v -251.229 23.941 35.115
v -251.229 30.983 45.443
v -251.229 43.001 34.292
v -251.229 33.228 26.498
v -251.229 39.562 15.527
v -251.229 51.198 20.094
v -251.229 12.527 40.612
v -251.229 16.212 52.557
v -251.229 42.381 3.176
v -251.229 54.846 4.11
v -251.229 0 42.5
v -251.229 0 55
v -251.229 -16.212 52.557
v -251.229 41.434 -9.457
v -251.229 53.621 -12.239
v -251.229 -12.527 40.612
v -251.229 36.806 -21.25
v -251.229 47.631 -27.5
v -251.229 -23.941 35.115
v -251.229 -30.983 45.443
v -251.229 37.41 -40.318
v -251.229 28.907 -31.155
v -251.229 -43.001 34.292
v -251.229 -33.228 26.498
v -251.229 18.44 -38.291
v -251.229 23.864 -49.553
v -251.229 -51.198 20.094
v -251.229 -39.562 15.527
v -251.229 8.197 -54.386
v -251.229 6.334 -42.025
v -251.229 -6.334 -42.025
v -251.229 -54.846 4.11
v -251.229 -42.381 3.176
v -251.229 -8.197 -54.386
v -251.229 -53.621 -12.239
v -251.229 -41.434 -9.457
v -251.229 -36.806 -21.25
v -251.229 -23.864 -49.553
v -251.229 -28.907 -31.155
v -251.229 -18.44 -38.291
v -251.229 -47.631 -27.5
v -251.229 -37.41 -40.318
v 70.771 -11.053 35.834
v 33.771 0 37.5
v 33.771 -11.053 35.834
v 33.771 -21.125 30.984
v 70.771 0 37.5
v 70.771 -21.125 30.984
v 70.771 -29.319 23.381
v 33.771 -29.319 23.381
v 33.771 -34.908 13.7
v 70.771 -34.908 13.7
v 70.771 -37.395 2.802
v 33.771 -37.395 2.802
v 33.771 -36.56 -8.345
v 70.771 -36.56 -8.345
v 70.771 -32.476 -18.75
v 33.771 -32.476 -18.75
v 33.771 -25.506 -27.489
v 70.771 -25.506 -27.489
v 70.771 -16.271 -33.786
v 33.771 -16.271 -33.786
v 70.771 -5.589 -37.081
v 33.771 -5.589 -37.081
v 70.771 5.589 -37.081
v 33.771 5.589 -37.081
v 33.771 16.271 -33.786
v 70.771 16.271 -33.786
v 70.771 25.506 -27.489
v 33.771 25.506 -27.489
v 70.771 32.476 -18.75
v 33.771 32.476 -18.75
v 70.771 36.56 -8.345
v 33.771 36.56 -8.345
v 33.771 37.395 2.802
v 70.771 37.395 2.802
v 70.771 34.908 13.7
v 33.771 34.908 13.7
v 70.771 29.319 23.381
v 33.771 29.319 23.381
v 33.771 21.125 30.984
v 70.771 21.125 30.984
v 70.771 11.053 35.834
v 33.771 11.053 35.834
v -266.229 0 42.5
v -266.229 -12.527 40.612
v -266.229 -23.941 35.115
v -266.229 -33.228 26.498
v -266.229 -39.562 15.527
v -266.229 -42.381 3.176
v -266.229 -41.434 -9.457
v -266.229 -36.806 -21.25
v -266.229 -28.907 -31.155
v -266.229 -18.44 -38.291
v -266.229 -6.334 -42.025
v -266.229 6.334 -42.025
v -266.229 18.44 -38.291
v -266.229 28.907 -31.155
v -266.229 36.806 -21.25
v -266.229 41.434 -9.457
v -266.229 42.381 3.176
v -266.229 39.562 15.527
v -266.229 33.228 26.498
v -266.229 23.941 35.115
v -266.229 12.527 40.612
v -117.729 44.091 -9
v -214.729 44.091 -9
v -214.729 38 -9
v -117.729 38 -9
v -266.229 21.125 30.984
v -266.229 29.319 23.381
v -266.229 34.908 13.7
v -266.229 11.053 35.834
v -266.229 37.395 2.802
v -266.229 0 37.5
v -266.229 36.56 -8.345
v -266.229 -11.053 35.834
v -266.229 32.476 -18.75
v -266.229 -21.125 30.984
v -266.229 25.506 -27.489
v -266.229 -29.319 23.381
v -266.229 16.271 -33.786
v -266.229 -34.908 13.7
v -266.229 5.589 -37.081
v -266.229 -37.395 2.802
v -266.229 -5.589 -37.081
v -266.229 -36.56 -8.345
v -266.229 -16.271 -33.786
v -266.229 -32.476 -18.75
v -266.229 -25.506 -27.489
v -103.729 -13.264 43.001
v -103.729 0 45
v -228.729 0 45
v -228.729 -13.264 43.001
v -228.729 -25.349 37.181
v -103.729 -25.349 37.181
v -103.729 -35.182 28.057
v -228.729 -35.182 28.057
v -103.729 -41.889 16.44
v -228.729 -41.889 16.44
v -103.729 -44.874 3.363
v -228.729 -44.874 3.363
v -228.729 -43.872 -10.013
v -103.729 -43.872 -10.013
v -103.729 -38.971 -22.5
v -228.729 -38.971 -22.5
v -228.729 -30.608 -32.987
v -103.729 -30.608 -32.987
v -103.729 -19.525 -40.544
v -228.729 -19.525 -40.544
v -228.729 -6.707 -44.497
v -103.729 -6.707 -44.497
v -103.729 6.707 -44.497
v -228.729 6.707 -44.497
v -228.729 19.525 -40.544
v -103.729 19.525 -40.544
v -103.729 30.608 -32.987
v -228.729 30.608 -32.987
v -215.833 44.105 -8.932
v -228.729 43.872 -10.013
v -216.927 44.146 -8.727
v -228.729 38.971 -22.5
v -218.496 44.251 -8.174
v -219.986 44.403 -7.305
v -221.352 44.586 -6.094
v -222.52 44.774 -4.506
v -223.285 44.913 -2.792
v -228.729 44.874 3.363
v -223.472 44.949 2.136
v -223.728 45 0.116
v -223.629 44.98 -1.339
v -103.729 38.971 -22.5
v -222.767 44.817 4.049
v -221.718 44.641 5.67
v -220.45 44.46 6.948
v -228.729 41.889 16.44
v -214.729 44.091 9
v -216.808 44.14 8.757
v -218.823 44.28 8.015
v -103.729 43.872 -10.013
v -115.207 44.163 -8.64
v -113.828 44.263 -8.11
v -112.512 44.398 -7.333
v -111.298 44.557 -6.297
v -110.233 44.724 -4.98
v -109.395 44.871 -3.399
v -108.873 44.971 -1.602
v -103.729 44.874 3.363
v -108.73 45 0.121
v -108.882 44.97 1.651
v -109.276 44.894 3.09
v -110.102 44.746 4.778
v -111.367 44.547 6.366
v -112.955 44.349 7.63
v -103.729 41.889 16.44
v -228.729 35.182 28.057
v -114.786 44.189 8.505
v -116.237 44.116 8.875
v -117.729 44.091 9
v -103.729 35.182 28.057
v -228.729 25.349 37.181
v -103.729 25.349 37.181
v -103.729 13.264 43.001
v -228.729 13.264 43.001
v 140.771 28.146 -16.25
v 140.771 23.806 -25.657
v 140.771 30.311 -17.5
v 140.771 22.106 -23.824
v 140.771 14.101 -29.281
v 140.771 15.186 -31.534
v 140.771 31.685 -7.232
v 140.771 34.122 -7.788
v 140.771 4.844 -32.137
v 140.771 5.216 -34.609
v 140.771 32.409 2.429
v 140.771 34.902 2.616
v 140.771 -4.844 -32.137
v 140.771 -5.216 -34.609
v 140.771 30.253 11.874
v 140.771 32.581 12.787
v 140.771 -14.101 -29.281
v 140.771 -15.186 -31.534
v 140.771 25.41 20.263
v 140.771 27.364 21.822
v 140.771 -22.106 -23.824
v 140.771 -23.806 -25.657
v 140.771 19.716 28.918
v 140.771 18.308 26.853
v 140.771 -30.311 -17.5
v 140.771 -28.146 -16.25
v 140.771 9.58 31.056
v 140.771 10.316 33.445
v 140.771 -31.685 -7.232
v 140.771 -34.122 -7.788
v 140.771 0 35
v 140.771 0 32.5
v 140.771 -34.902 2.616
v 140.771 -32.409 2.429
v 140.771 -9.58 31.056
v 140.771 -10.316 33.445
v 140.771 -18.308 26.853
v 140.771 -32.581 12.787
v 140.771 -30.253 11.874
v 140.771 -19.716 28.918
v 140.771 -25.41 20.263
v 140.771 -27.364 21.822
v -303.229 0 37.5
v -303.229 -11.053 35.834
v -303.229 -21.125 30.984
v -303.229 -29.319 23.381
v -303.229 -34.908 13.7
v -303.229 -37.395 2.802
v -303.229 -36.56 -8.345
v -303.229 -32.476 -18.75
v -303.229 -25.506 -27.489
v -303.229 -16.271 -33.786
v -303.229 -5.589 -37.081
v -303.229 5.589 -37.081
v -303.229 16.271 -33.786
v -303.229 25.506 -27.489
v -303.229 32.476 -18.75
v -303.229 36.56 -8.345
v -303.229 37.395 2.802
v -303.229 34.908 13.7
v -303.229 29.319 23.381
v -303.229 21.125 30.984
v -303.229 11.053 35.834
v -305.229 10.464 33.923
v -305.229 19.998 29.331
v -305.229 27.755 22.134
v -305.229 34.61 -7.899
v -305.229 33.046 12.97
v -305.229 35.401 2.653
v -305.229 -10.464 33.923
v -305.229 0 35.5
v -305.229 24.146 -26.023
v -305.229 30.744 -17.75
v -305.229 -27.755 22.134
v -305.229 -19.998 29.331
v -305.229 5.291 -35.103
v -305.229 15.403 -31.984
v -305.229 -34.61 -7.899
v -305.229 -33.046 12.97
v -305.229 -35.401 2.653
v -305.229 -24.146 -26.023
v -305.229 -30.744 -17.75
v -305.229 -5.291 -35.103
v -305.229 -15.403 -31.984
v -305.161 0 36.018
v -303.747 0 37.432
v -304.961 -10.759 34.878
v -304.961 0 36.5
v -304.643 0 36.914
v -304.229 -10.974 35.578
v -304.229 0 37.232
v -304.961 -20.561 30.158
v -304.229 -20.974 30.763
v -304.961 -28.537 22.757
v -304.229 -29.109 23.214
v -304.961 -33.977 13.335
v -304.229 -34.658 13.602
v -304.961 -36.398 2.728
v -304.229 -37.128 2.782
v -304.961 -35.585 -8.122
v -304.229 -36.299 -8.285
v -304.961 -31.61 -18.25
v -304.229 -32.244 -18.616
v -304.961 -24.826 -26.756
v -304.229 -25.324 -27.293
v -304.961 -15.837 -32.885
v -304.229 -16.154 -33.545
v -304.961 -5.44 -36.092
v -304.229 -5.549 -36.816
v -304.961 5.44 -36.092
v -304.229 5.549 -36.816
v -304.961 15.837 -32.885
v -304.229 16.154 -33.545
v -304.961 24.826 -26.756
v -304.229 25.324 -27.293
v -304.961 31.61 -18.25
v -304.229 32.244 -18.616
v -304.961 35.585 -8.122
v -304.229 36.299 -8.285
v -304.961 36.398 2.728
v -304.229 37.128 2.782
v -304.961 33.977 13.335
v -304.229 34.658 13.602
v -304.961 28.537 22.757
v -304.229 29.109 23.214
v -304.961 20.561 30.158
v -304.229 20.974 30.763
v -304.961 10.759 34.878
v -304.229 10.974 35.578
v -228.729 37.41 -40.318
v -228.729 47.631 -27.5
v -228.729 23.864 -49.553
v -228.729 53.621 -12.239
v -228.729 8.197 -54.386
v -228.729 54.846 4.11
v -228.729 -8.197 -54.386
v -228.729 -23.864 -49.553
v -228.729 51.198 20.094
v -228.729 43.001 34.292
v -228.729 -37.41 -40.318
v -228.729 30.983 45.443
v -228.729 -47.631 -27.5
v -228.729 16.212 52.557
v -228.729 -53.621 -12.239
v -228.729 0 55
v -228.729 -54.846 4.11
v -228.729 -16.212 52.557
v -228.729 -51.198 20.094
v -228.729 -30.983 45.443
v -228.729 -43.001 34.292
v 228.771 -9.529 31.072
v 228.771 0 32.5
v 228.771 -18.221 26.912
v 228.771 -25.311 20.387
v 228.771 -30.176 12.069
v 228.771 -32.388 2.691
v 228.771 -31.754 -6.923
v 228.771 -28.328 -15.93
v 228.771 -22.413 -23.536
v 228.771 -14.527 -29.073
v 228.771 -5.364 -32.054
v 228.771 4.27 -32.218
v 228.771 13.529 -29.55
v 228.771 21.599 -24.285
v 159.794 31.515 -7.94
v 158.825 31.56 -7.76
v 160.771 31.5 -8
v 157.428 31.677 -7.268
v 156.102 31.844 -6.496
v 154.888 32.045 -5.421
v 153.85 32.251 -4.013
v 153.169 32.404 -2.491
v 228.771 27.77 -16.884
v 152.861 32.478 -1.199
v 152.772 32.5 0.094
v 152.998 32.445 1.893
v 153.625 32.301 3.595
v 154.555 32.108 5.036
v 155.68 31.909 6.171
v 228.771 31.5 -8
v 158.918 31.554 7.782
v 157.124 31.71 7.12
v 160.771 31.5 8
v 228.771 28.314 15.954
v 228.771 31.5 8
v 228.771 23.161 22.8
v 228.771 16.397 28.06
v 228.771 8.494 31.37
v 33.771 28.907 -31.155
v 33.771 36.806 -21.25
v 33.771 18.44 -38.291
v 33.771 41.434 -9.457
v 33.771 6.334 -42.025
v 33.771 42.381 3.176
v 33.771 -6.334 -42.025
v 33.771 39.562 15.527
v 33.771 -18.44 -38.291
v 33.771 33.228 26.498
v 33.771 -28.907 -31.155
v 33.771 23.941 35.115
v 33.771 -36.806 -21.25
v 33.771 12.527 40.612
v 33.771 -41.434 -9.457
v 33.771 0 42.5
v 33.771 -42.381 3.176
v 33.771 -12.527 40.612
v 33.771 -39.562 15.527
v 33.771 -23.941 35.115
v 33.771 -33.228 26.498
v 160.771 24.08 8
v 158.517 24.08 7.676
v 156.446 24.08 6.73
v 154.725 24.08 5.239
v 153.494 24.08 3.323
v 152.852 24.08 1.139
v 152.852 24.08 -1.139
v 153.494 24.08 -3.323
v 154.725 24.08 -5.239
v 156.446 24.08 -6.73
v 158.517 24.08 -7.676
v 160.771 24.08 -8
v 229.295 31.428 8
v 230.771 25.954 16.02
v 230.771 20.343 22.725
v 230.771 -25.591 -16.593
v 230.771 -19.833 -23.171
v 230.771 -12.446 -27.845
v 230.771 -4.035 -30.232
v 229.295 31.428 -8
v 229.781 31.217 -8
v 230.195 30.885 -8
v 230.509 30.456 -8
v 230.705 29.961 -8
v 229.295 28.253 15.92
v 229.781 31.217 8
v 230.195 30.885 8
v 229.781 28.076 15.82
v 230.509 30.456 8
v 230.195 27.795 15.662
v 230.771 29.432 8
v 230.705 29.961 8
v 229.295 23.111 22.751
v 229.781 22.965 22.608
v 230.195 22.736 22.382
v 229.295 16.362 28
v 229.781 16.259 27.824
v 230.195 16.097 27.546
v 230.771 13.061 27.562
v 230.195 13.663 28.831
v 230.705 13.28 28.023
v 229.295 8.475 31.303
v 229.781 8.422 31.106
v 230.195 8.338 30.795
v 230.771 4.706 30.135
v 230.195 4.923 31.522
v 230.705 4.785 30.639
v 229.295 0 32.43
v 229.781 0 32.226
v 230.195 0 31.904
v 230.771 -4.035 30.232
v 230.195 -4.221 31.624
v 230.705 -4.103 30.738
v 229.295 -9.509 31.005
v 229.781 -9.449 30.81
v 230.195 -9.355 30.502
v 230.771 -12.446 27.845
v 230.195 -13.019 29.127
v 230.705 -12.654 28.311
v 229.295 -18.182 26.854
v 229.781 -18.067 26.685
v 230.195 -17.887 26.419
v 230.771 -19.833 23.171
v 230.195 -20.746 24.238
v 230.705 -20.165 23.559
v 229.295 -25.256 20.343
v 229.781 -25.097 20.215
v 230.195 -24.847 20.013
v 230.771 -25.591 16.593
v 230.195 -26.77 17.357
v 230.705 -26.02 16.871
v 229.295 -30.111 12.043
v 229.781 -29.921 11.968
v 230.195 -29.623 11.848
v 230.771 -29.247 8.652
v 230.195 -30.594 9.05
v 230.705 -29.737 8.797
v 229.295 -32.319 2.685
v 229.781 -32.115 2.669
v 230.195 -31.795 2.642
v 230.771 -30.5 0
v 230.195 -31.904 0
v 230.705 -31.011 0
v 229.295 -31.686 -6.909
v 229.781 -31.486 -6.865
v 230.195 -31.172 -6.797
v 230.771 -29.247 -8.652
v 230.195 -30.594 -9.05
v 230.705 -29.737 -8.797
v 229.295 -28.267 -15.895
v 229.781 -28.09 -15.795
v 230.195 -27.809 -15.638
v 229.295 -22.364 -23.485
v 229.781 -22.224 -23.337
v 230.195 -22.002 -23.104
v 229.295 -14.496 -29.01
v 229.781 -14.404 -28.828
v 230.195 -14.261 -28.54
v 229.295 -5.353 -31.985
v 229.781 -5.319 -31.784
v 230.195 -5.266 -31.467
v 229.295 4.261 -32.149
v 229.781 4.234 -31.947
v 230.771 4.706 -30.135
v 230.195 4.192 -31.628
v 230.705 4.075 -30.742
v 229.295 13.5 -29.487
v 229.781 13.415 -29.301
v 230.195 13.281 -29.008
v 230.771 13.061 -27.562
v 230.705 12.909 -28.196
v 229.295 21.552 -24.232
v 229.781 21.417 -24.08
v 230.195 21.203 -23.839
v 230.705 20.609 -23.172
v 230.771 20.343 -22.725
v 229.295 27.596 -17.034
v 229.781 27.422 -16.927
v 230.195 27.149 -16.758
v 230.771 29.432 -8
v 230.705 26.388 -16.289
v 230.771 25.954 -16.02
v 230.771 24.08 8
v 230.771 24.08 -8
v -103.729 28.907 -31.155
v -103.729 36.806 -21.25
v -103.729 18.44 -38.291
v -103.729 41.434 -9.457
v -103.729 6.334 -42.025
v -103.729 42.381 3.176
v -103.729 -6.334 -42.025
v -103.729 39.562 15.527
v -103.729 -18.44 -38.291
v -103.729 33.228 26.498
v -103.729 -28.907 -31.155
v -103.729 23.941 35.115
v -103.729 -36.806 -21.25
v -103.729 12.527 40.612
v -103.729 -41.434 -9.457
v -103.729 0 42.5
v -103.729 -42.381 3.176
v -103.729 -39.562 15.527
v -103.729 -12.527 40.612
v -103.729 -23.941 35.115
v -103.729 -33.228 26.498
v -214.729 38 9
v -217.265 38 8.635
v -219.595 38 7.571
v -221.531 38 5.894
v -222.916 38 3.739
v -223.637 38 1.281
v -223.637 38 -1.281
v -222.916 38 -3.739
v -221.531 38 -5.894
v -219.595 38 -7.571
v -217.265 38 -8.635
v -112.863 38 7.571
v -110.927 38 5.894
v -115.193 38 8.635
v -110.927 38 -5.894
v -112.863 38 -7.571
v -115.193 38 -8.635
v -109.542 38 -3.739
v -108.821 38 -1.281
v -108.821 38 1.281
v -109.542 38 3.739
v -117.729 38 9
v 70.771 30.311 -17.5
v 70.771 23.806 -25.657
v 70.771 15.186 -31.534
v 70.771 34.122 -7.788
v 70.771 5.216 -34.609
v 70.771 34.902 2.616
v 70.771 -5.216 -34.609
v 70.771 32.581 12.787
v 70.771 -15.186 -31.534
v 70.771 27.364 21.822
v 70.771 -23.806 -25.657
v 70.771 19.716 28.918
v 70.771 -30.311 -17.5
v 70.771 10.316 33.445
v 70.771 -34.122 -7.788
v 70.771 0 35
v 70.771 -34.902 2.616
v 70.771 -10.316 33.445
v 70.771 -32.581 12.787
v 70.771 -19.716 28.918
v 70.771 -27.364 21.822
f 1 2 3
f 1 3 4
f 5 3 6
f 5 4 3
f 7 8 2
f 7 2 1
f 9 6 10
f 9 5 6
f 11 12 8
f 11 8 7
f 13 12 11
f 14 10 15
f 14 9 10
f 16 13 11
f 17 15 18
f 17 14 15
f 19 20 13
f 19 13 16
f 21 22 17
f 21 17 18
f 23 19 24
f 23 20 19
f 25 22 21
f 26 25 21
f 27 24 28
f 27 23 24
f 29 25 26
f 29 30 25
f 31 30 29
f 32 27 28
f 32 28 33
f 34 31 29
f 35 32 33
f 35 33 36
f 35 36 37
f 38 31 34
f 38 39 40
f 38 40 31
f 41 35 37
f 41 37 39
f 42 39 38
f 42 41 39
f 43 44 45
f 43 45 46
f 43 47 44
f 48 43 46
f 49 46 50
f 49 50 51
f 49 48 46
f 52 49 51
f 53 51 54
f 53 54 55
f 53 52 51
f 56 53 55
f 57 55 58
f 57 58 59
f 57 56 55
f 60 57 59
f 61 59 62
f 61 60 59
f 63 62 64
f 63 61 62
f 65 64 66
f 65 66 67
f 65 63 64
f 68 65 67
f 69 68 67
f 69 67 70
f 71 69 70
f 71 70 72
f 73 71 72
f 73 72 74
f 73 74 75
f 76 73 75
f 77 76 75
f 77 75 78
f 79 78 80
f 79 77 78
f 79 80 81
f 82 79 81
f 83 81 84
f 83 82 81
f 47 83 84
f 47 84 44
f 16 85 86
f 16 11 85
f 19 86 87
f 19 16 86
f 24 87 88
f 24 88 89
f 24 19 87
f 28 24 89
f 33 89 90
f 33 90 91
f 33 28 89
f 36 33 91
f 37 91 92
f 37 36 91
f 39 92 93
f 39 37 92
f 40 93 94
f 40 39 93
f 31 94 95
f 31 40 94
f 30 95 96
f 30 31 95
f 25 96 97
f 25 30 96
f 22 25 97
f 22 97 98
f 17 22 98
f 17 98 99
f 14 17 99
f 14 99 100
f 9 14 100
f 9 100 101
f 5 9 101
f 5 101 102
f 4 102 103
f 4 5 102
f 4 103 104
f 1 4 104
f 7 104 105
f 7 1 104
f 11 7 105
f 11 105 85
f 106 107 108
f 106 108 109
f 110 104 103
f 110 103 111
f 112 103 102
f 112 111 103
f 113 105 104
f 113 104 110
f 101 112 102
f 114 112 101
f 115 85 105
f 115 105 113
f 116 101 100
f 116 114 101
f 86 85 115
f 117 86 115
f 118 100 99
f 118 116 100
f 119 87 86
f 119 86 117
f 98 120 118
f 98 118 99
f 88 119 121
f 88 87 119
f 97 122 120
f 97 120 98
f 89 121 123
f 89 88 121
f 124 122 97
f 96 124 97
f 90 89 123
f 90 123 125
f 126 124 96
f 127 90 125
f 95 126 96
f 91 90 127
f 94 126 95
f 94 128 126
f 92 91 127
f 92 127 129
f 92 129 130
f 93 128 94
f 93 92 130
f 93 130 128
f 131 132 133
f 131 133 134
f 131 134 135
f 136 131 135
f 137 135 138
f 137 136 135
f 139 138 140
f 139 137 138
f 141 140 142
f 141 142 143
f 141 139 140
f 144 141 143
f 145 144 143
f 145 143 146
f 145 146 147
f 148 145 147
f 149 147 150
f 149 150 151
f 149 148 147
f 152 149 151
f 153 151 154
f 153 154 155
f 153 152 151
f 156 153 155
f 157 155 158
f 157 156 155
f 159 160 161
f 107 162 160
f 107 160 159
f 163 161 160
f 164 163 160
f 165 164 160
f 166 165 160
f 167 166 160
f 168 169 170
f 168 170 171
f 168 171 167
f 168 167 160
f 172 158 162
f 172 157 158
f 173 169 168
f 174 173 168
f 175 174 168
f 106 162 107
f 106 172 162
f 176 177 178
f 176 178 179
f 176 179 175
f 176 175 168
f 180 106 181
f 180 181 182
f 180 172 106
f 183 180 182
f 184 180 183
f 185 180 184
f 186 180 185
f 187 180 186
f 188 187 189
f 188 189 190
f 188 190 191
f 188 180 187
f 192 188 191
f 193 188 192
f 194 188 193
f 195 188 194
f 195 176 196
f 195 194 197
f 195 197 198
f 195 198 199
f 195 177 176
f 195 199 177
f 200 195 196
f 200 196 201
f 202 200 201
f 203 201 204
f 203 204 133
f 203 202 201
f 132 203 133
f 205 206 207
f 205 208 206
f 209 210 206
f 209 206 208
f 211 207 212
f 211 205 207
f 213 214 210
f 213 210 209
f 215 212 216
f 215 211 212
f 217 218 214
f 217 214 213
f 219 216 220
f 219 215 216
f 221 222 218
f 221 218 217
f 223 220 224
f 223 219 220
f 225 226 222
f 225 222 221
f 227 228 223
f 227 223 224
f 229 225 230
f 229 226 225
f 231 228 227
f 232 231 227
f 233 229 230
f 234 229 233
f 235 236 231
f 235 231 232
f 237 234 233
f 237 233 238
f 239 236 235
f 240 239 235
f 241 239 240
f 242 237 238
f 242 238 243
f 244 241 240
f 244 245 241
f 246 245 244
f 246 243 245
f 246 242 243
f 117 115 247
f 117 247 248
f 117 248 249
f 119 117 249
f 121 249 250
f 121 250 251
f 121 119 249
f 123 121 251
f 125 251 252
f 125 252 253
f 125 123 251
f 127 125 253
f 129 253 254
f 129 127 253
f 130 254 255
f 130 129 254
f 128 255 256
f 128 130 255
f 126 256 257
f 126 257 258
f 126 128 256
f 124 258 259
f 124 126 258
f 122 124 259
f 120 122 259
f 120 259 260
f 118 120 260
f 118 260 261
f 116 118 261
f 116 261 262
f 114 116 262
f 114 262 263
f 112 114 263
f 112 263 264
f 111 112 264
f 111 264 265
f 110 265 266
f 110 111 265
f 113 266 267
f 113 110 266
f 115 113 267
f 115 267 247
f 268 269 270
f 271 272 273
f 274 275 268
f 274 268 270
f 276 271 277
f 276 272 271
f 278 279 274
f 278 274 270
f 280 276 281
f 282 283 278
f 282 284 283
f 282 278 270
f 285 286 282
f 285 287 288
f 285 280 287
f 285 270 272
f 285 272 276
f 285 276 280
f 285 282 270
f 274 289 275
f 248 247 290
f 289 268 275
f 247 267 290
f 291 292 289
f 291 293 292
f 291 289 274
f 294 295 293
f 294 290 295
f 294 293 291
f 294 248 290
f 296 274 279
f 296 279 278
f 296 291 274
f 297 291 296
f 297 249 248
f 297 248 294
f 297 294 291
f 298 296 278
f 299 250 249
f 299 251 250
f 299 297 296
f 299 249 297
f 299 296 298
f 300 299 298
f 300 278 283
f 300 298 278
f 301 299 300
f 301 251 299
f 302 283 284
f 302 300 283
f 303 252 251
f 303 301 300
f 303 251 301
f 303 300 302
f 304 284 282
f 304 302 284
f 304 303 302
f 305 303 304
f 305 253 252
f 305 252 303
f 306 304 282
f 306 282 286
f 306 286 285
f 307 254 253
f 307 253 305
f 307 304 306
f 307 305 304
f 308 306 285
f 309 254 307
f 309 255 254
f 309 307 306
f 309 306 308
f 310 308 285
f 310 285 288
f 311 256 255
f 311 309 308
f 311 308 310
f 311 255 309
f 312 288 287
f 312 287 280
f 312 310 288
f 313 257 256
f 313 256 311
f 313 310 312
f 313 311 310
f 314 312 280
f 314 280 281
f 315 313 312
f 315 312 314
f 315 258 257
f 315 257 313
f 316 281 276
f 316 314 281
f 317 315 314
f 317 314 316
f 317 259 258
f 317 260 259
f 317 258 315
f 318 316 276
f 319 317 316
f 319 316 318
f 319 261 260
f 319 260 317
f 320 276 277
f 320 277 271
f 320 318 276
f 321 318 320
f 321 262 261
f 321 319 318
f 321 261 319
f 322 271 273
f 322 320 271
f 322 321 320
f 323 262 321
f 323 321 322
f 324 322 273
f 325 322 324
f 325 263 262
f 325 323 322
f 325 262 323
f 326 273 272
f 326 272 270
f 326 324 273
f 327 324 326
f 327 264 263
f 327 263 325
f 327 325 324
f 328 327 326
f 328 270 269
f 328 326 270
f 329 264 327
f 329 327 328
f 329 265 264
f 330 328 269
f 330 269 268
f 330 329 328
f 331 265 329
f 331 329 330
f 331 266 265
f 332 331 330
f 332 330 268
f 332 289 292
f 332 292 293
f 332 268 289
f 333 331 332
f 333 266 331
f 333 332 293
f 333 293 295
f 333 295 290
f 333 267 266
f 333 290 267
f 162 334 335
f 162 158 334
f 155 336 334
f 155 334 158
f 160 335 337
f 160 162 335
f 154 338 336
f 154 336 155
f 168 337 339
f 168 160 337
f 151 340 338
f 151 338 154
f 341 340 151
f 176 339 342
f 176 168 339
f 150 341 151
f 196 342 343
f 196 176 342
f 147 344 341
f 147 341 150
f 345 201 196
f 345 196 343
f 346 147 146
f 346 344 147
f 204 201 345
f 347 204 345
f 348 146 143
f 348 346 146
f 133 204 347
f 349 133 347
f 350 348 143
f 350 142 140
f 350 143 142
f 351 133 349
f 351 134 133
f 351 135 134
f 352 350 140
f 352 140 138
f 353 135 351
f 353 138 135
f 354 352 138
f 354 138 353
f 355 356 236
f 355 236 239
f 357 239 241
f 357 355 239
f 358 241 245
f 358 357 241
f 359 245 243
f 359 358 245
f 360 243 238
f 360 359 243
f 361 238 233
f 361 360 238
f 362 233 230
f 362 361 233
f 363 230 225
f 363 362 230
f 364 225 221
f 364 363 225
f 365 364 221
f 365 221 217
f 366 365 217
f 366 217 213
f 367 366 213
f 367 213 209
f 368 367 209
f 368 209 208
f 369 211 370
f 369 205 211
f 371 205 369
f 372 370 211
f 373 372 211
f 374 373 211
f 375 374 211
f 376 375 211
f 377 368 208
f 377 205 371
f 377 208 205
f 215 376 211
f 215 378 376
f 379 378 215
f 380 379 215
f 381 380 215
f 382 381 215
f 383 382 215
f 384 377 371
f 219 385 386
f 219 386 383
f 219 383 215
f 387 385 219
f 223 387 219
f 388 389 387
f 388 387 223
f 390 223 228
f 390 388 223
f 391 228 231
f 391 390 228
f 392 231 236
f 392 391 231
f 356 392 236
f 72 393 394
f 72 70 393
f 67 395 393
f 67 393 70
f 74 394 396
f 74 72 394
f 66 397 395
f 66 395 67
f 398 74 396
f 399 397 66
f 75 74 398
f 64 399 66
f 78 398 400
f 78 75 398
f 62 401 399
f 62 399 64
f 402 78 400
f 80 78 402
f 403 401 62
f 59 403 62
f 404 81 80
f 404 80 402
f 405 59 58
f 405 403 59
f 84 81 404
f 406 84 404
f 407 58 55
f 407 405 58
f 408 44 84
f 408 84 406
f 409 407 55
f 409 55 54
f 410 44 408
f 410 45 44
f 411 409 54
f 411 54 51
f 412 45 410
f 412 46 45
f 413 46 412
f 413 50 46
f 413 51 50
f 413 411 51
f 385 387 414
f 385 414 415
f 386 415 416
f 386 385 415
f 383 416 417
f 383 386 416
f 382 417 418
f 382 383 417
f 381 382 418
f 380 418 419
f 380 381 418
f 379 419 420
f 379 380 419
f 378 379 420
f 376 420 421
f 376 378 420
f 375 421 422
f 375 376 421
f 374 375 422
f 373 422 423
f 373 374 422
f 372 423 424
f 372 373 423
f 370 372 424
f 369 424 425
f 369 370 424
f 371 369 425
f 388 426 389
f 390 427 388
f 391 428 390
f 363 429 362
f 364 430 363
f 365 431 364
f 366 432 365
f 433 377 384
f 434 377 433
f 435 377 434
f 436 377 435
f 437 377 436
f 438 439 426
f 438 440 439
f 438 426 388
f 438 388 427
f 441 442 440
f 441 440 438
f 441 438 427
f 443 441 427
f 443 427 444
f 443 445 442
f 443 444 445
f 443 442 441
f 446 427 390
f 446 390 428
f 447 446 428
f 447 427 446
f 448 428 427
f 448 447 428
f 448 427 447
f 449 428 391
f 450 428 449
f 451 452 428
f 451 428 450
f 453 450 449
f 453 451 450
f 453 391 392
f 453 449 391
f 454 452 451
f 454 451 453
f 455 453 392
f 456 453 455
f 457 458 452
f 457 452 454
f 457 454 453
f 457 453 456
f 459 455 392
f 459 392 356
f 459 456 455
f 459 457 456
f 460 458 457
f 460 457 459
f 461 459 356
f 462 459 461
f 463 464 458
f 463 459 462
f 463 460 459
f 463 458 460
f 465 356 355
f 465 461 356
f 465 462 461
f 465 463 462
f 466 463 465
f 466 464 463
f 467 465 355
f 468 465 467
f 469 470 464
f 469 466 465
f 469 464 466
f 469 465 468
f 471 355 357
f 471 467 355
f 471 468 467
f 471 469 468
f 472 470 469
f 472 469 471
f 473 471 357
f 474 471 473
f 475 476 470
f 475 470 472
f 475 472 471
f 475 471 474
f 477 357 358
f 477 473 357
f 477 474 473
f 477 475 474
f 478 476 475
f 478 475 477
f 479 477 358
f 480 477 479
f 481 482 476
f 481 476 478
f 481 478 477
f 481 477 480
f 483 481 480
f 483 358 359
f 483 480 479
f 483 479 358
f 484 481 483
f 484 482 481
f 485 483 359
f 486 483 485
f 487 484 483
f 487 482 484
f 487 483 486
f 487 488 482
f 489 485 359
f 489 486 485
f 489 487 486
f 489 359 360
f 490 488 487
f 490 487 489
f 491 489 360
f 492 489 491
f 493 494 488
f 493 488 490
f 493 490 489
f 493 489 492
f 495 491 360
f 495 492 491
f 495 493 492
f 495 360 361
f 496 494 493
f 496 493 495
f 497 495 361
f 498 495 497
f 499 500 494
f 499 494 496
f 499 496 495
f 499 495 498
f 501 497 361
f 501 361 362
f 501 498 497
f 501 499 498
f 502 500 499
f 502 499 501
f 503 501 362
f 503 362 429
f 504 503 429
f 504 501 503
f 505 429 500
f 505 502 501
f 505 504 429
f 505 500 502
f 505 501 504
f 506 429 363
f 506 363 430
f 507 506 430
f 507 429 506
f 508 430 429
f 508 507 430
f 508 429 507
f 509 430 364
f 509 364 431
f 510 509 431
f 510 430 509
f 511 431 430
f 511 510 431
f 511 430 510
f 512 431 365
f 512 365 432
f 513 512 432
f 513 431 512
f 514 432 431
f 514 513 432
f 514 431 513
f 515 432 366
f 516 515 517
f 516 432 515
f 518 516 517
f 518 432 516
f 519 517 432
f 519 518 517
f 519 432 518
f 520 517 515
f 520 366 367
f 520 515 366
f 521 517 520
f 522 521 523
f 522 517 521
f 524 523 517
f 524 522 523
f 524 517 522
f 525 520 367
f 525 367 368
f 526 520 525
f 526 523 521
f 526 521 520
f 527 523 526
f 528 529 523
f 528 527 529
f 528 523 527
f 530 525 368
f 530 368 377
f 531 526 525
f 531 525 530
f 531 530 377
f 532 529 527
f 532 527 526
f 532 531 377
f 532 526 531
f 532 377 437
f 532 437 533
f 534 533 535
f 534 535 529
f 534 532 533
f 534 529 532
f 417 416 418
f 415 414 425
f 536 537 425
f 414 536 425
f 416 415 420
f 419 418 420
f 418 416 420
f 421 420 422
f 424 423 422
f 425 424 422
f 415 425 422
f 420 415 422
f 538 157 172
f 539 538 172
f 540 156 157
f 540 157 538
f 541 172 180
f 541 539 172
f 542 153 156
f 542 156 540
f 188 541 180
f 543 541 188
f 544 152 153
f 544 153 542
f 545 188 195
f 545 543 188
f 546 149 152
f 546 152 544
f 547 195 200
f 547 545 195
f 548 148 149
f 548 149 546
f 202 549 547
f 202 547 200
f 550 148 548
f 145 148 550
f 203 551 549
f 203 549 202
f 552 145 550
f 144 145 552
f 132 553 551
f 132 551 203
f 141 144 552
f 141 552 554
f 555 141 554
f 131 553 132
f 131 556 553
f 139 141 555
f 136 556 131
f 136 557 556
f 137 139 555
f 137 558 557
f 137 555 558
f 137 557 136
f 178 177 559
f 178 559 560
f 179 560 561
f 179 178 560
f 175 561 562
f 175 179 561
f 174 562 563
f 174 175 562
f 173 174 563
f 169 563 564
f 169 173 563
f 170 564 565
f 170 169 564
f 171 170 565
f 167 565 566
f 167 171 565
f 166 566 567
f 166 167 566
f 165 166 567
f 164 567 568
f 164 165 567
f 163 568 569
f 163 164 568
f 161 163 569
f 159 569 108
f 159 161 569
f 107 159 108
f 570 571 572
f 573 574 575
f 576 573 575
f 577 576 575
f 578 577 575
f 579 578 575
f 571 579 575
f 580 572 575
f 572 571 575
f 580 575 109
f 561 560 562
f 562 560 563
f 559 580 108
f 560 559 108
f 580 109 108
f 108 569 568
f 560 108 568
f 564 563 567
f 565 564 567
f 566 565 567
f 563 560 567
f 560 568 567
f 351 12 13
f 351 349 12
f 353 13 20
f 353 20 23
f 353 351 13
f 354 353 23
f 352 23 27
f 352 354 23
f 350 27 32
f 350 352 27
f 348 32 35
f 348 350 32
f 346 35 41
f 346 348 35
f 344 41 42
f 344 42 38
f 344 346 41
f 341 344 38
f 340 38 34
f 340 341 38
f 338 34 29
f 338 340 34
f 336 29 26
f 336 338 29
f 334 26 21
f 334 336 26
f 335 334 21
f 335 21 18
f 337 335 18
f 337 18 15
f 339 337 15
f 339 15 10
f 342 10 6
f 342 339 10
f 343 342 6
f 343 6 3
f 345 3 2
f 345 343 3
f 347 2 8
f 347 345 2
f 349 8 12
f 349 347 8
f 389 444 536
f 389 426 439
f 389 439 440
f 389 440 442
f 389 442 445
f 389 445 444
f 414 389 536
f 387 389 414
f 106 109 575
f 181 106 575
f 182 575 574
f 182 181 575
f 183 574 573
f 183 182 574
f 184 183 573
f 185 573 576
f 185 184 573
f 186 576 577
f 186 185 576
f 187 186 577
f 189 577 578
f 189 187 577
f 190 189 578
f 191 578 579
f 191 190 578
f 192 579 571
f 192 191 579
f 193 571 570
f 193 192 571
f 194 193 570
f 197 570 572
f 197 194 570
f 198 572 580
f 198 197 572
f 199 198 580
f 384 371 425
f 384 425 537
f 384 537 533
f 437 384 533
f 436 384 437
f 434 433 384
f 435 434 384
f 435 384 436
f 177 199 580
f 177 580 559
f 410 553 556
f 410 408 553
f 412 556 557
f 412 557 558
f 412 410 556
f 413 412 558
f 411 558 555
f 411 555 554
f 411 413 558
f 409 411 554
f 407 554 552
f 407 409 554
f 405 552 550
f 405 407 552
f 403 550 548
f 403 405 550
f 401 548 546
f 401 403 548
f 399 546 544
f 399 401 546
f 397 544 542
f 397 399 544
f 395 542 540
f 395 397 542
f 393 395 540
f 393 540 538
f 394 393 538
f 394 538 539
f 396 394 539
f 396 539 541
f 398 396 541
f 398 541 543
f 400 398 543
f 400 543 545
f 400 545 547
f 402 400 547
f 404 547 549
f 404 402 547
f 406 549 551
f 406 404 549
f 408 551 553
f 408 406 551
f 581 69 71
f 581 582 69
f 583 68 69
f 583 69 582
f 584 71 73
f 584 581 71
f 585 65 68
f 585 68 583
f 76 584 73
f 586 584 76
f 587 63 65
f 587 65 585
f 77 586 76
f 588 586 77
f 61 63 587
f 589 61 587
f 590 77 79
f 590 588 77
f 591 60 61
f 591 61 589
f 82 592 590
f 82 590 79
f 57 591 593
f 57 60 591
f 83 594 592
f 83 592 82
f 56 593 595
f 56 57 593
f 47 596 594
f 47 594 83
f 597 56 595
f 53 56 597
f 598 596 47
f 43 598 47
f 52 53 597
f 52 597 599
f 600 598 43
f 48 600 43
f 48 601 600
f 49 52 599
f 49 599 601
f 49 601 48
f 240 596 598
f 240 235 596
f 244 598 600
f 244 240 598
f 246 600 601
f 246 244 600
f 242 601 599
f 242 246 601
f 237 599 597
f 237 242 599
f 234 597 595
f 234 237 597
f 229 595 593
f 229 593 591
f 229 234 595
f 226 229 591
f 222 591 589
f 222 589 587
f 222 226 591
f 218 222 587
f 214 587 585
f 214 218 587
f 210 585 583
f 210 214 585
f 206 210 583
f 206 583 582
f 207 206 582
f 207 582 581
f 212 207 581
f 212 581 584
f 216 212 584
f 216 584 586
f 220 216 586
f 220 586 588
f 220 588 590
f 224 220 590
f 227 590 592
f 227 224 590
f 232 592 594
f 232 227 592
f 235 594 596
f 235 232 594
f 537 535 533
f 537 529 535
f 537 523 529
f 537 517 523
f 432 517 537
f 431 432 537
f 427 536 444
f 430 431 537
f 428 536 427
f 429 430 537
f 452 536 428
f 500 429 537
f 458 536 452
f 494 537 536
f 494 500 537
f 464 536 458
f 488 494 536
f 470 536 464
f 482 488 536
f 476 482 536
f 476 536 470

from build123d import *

# Parameters (mm, degrees)
FILLET1_R          = 2
CUT_EXTRUDE1_DEPTH = 7
CUT_EXTRUDE2_DEPTH = 8.42


with BuildPart() as part:
    # Sketch1 → Revolve1 (revolve)
    with BuildSketch(Plane.XY, mode=Mode.PRIVATE) as revolve1_sk:
        Polygon((-305.228973115, 0), (-305.228973115, 37.5), (-266.228973115, 37.5), (-266.228973115, 42.5), (-251.228973115, 42.5), (-251.228973115, 55), (-228.728973115, 55), (-228.728973115, 45), (-103.728973115, 45), (-103.728973115, 42.5), (33.771026885, 42.5), (33.771026885, 37.5), (70.771026885, 37.5), (70.771026885, 35), (140.771026885, 35), (140.771026885, 32.5), (230.771026885, 32.5), (230.771026885, 0), align=None)
    revolve(revolve1_sk.sketch.rotate(Axis((-305.228973115, 0, 0), (1, 0, 0)), 90), axis=Axis((-305.228973115, 0, 0), (1, 0, 0)))

    # Fillet1
    fillet1_edges = [part.edges().sort_by_distance(p)[0] for p in [
        (230.771026885, 0, -32.5),
        (-305.228973115, 0, -37.5),
    ]]
    fillet(fillet1_edges, radius=FILLET1_R)

    # Sketch2 → Cut-Extrude1 (cut)
    with BuildSketch(Plane(origin=(0, 45, 0), x_dir=(1, 0, 0), z_dir=(0, 1, 0))):
        with BuildLine():
            Line((-214.728973115, 9), (-117.728973115, 9))
            ThreePointArc((-117.728973115, 9), (-108.728973115, 0), (-117.728973115, -9))
            Line((-117.728973115, -9), (-214.728973115, -9))
            ThreePointArc((-214.728973115, -9), (-223.728973115, 0), (-214.728973115, 9))
        make_face()
    extrude(amount=-CUT_EXTRUDE1_DEPTH, mode=Mode.SUBTRACT)

    # Sketch3 → Cut-Extrude2 (cut)
    with BuildSketch(Plane(origin=(0, 32.5, 0), x_dir=(1, 0, 0), z_dir=(0, 1, 0))):
        with BuildLine():
            Line((160.771026885, 8), (239.672202356, 8))
            ThreePointArc((239.672202356, 8), (247.672202356, 0), (239.672202356, -8))
            Line((239.672202356, -8), (160.771026885, -8))
            ThreePointArc((160.771026885, -8), (152.771026885, 0), (160.771026885, 8))
        make_face()
    extrude(amount=-CUT_EXTRUDE2_DEPTH, mode=Mode.SUBTRACT)


solid = part.part
